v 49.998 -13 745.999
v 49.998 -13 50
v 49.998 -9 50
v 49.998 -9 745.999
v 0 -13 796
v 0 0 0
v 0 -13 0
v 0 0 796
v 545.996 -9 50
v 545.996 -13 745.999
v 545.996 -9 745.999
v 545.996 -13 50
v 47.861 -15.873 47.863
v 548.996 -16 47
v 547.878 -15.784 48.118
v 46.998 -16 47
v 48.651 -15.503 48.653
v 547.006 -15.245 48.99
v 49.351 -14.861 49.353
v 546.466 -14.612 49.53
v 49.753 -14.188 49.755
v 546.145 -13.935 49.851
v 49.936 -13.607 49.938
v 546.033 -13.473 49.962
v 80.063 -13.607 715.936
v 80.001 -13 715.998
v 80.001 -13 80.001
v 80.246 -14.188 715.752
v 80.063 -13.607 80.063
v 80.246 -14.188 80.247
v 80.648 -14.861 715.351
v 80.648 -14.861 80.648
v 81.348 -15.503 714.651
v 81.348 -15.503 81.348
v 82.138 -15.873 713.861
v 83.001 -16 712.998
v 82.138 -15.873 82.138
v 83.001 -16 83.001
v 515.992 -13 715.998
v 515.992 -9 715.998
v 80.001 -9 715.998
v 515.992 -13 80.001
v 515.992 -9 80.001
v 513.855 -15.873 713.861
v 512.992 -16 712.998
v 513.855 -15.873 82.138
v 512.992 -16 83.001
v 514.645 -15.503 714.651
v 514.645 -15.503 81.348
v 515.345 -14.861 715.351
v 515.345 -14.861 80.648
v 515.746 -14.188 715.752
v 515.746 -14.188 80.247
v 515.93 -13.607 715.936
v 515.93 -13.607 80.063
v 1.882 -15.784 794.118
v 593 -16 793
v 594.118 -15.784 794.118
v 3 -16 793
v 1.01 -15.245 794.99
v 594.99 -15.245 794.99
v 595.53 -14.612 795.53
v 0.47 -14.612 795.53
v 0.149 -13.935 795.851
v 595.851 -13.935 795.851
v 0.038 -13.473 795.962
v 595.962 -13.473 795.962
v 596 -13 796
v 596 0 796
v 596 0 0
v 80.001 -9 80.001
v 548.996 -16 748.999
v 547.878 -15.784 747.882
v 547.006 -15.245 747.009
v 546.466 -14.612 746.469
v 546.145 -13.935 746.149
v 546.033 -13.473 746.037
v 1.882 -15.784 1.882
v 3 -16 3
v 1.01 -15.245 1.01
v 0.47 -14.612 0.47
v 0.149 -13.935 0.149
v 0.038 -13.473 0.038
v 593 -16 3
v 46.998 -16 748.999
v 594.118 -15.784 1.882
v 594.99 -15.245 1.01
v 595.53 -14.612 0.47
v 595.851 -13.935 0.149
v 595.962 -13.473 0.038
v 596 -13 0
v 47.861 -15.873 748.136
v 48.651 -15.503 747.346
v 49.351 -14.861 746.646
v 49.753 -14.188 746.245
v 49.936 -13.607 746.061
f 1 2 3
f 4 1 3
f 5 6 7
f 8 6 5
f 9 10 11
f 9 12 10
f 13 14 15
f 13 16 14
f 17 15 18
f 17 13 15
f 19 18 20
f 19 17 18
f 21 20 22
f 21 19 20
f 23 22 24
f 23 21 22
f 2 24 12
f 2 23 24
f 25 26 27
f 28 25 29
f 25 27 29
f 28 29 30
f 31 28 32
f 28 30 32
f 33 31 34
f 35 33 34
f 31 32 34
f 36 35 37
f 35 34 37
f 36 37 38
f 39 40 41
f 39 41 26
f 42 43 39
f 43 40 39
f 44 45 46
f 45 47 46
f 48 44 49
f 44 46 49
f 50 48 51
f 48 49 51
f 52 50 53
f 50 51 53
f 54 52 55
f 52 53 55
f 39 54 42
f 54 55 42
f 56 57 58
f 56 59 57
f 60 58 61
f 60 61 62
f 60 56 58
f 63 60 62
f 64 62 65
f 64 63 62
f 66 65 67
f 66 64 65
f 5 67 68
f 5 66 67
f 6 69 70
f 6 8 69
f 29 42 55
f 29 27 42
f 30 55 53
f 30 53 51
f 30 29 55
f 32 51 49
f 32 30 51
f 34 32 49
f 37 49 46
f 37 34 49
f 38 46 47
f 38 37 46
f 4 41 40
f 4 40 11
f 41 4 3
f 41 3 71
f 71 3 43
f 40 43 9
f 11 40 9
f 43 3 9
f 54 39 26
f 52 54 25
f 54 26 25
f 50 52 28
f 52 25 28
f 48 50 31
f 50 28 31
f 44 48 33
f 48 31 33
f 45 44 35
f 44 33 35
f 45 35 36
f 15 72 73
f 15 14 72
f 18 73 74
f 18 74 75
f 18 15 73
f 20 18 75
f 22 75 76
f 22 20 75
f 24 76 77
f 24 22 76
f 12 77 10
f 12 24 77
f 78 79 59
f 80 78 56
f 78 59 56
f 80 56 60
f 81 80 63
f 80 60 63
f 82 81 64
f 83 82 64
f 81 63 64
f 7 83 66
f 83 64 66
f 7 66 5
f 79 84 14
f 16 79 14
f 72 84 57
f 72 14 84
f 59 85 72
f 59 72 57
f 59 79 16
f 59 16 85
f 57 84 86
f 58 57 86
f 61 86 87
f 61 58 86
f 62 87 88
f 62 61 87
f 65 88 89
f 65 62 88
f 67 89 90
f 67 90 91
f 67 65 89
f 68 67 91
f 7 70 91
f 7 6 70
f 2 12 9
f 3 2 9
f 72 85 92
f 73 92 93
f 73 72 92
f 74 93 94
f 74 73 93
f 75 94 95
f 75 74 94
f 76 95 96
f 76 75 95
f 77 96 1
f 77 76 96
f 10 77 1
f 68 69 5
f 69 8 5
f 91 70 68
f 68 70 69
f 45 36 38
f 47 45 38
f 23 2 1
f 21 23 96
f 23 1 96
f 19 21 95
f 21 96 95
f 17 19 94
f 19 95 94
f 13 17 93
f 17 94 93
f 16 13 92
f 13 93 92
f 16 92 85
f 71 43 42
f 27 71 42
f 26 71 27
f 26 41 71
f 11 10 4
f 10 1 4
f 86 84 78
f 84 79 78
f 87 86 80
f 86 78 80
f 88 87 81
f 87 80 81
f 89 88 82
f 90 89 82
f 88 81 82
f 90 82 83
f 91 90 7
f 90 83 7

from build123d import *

# Parameters (mm, degrees)
F0_W      = 44.656470418
F0_H      = 33.8078811765
F1_DEPTH  = 16
F2_DEPTH  = 796
F3_DEPTH  = 196
F4_W      = 68.9578056335
F4_H      = 493.6993122101
F5_DEPTH  = 7
F6_DEPTH  = 9.7
F7_DEPTH  = 99.33
F8_DEPTH  = 99.33
F9_DEPTH  = 17.34
F10_DEPTH = 102.97
F11_W     = 35.2807044983
F11_H     = 492.0964837074
F12_DEPTH = 7
F13_DEPTH = 37.27
F14_DEPTH = 6.58
F15_DEPTH = 106.63
F16_DEPTH = 5.87
F17_DEPTH = 200
F18_DEPTH = 200
F19_DEPTH = 200
F20_DEPTH = 200
F21_DEPTH = 200
F22_DEPTH = 200
F23_R     = 3


with BuildPart() as f1:
    # F0 (on Front) → F1 (new body)
    with BuildSketch(Plane.XZ):
        with Locations((22.328235209, 16.9039405882)):
            Rectangle(F0_W, F0_H)
    extrude(amount=F1_DEPTH)

    # F2 (add): a face of the model
    f2_faces = [f1.faces().sort_by_distance(p)[0] for p in [
        (22.328235209, -8, 0),
    ]]
    extrude(f2_faces, amount=-F2_DEPTH)

    # F3 (add): a face of the model
    f3_faces = [f1.faces().sort_by_distance(p)[0] for p in [
        (0, -8, 398),
    ]]
    extrude(f3_faces, amount=-F3_DEPTH)

    # F4 (on face) → F5 (cut)
    with BuildSketch(Plane.XZ.offset(16)):
        with Locations((94.1769480705, 399.8196721077)):
            Rectangle(F4_W, F4_H)
    extrude(amount=-F5_DEPTH, mode=Mode.SUBTRACT)

    # F6 (cut): a face of the model
    f6_faces = [f1.faces().sort_by_distance(p)[0] for p in [
        (59.6980452538, -12.5, 399.8196721077),
    ]]
    extrude(f6_faces, amount=-F6_DEPTH, mode=Mode.SUBTRACT)

    # F7 (add): a face of the model
    f7_faces = [f1.faces().sort_by_distance(p)[0] for p in [
        (89.3269480705, -12.5, 646.6693282127),
    ]]
    extrude(f7_faces, amount=-F7_DEPTH)

    # F8 (cut): a face of the model
    f8_faces = [f1.faces().sort_by_distance(p)[0] for p in [
        (89.3269480705, -12.5, 646.6693282127),
    ]]
    extrude(f8_faces, amount=-F8_DEPTH, mode=Mode.SUBTRACT)

    # F9 (cut): a face of the model
    f9_faces = [f1.faces().sort_by_distance(p)[0] for p in [
        (128.6558508873, -12.5, 449.4846721077),
    ]]
    extrude(f9_faces, amount=-F9_DEPTH, mode=Mode.SUBTRACT)

    # F10 (cut): a face of the model
    f10_faces = [f1.faces().sort_by_distance(p)[0] for p in [
        (97.9969480705, -12.5, 152.9700160027),
    ]]
    extrude(f10_faces, amount=-F10_DEPTH, mode=Mode.SUBTRACT)

    # F11 (on face) → F12 (join)
    with BuildSketch(Plane.XZ.offset(9)):
        with Locations((91.7714834213, 432.6795041561)):
            Rectangle(F11_W, F11_H)
    extrude(amount=F12_DEPTH)

    # F13 (add): a face of the model
    f13_faces = [f1.faces().sort_by_distance(p)[0] for p in [
        (91.7714834213, -12.5, 678.7277460098),
    ]]
    extrude(f13_faces, amount=F13_DEPTH)

    # F14 (add): a face of the model
    f14_faces = [f1.faces().sort_by_distance(p)[0] for p in [
        (109.4118356705, -12.5, 451.3145041561),
    ]]
    extrude(f14_faces, amount=F14_DEPTH)

    # F15 (add): a face of the model
    f15_faces = [f1.faces().sort_by_distance(p)[0] for p in [
        (95.0614834213, -12.5, 186.6312623024),
    ]]
    extrude(f15_faces, amount=F15_DEPTH)

    # F16 (cut): a face of the model
    f16_faces = [f1.faces().sort_by_distance(p)[0] for p in [
        (74.1311311722, -12.5, 397.9995041561),
    ]]
    extrude(f16_faces, amount=-F16_DEPTH, mode=Mode.SUBTRACT)

    # F17 (add): a face of the model
    f17_faces = [f1.faces().sort_by_distance(p)[0] for p in [
        (196, -8, 398),
    ]]
    extrude(f17_faces, amount=F17_DEPTH)

    # F18 (cut): a face of the model
    f18_faces = [f1.faces().sort_by_distance(p)[0] for p in [
        (145.9958508873, -12.5, 397.9996721077),
    ]]
    extrude(f18_faces, amount=-F18_DEPTH, mode=Mode.SUBTRACT)

    # F19 (add): a face of the model
    f19_faces = [f1.faces().sort_by_distance(p)[0] for p in [
        (115.9918356705, -12.5, 397.9995041561),
    ]]
    extrude(f19_faces, amount=F19_DEPTH)

    # F20 (add): a face of the model
    f20_faces = [f1.faces().sort_by_distance(p)[0] for p in [
        (396, -8, 398),
    ]]
    extrude(f20_faces, amount=F20_DEPTH)

    # F21 (cut): a face of the model
    f21_faces = [f1.faces().sort_by_distance(p)[0] for p in [
        (345.9958508873, -12.5, 397.9996721077),
    ]]
    extrude(f21_faces, amount=-F21_DEPTH, mode=Mode.SUBTRACT)

    # F22 (add): a face of the model
    f22_faces = [f1.faces().sort_by_distance(p)[0] for p in [
        (315.9918356705, -12.5, 397.9995041561),
    ]]
    extrude(f22_faces, amount=F22_DEPTH)

    # F23
    f23_edges = [f1.edges().sort_by_distance(p)[0] for p in [
        (297.996483, -16, 715.997746),
        (80.001131, -16, 397.999504),
        (297.996483, -16, 80.001262),
        (515.991836, -16, 397.999504),
        (0, -16, 398),
        (298, -16, 0),
        (596, -16, 398),
        (298, -16, 796),
        (49.998045, -16, 397.999672),
        (297.996948, -16, 745.999328),
        (545.995851, -16, 397.999672),
        (297.996948, -16, 50.000016),
    ]]
    fillet(f23_edges, radius=F23_R)


solid = f1.part
